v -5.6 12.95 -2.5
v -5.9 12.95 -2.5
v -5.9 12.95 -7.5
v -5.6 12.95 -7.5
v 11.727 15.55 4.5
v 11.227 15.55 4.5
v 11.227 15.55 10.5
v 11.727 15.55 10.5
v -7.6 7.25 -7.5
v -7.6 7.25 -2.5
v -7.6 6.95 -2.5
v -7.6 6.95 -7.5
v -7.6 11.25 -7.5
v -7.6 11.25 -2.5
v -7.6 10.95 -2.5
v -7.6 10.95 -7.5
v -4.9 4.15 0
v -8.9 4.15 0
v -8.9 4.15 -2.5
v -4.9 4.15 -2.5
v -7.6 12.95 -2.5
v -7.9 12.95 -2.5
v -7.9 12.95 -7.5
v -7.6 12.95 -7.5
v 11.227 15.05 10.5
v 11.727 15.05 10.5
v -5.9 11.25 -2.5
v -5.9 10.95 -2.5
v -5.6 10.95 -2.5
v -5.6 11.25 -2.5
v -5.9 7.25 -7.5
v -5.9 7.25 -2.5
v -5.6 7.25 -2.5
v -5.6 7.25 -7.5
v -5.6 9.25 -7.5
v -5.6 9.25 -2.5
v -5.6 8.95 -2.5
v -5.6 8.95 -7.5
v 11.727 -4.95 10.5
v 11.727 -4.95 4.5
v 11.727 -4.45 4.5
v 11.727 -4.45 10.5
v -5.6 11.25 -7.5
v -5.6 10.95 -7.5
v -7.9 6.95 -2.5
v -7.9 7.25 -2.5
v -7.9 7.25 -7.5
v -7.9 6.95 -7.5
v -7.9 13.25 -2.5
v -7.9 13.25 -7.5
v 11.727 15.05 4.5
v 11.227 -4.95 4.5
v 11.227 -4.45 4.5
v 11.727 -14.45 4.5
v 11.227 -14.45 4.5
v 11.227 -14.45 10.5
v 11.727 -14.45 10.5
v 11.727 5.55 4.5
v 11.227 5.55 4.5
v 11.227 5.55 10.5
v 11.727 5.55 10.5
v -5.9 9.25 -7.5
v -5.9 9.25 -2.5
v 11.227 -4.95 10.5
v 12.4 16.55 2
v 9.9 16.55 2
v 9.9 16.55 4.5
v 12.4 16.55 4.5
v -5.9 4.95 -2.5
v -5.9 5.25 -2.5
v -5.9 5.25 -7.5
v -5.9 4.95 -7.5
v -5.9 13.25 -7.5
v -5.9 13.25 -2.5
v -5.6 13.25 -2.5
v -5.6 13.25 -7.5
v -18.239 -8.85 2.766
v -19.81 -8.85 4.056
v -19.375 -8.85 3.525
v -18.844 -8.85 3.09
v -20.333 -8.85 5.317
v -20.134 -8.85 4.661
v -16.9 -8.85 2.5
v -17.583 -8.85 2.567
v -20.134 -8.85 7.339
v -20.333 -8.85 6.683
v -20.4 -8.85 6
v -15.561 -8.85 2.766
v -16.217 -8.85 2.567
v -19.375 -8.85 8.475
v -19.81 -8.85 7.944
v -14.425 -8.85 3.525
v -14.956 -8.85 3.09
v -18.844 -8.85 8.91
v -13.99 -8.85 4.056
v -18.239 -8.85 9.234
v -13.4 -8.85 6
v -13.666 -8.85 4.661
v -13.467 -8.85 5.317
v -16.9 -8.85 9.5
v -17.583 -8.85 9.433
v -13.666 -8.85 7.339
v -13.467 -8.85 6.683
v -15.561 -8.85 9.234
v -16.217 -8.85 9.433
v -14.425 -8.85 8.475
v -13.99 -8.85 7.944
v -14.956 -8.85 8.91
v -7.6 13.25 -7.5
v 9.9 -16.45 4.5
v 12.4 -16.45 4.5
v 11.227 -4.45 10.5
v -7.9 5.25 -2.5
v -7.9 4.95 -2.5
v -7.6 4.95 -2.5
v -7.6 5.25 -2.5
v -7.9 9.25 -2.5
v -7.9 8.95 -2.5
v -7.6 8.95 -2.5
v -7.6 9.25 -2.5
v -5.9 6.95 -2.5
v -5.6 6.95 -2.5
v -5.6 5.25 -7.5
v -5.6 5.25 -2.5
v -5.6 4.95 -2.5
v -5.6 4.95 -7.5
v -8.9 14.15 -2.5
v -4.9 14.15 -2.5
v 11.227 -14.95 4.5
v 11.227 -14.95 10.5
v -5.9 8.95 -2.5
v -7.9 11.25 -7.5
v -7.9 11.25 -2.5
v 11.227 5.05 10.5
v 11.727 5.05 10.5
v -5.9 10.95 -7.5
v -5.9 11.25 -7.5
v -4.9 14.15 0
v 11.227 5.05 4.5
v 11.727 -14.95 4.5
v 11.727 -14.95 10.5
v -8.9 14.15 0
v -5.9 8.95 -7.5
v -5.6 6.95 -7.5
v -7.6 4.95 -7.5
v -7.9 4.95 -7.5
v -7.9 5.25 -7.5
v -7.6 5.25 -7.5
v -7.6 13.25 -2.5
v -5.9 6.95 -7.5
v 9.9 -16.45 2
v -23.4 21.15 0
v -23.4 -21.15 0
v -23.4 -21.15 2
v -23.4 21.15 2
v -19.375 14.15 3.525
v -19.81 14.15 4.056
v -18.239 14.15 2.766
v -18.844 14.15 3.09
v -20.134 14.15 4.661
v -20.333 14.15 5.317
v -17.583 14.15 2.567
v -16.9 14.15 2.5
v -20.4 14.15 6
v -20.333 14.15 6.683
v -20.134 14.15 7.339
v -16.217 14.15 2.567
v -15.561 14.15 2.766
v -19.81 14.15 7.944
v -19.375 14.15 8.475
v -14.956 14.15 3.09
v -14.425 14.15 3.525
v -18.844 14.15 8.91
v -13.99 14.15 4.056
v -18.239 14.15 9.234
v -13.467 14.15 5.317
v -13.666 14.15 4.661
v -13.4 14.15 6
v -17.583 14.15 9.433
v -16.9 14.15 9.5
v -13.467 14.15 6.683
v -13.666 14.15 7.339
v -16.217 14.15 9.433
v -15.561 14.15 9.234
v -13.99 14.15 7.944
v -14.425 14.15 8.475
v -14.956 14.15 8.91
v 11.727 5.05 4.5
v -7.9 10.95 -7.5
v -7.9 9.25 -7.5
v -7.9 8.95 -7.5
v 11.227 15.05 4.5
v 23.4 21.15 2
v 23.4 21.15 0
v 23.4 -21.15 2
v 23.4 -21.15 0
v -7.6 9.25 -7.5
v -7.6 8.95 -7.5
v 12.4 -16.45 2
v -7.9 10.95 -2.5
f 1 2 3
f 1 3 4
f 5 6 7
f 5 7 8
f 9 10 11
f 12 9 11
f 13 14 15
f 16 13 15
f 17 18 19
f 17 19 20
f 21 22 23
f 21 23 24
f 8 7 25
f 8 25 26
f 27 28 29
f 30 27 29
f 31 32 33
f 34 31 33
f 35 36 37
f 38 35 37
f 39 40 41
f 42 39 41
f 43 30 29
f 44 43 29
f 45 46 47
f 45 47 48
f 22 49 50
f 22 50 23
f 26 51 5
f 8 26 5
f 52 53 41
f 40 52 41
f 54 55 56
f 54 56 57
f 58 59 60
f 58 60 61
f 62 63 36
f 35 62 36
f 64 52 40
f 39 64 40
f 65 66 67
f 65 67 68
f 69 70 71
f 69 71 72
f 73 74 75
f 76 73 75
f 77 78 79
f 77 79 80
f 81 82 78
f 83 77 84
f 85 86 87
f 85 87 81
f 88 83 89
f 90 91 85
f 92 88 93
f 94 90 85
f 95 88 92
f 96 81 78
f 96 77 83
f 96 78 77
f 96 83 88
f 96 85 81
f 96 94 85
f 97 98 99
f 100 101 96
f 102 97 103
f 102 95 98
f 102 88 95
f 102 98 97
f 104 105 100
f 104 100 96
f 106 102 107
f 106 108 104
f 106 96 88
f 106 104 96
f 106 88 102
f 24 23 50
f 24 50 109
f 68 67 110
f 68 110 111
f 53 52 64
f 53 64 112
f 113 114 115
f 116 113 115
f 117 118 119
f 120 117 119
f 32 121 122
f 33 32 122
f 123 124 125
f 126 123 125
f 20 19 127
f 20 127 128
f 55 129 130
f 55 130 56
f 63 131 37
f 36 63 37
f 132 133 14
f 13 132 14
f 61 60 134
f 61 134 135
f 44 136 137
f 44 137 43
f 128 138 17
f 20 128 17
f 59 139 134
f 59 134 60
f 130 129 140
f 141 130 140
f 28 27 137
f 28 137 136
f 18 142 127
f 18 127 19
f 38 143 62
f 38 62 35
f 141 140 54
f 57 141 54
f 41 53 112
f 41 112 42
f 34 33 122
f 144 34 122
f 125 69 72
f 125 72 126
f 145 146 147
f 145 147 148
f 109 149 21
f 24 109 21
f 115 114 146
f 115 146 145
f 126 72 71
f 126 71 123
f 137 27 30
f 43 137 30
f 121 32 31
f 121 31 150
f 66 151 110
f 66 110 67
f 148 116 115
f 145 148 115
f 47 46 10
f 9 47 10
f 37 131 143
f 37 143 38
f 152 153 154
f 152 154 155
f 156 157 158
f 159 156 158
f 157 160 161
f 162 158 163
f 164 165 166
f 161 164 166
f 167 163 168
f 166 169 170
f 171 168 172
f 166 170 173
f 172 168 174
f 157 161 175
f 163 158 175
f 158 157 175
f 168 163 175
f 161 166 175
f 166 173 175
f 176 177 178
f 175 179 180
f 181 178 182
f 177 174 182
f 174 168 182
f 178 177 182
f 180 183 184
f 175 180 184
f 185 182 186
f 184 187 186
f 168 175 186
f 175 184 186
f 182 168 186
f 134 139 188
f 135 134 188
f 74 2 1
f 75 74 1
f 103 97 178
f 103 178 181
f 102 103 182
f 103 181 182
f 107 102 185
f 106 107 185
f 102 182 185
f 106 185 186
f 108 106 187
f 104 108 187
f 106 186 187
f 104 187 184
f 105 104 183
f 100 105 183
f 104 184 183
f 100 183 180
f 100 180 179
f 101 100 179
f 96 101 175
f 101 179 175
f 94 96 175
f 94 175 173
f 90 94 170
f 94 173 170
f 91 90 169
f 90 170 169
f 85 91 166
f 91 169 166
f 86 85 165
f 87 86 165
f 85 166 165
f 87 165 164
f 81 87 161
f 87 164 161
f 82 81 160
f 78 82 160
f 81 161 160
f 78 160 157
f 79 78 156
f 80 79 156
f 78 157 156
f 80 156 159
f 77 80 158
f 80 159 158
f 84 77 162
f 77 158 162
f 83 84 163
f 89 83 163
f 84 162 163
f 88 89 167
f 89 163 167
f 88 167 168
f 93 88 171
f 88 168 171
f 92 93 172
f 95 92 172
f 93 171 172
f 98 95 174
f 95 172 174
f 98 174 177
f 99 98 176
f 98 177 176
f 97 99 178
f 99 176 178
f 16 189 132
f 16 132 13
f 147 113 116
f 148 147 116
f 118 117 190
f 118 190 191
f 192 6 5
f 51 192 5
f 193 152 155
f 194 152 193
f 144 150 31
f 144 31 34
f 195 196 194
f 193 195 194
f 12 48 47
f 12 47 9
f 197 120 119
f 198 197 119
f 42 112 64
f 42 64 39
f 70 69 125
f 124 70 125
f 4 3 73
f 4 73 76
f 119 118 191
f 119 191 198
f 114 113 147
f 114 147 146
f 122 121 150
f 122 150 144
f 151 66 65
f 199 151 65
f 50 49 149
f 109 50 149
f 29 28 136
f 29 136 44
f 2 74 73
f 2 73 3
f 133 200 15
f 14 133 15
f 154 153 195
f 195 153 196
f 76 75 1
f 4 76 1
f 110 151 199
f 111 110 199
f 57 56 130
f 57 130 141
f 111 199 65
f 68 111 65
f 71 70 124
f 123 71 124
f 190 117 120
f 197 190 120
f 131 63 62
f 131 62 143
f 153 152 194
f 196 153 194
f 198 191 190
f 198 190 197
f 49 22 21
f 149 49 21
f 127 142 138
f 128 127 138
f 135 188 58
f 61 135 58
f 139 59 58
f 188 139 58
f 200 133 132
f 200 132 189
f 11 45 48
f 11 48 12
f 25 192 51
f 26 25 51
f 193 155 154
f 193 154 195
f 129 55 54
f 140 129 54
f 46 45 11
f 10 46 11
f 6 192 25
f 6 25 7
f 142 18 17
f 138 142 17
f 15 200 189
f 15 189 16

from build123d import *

# Parameters (mm, degrees)
F2_W      = 46.8
F2_H      = 42.3
F3_DEPTH  = 2
F5_R      = 3.5
F6_DEPTH  = 23
F7_W      = 2.5
F7_H      = 33
F8_DEPTH  = 2.5
F9_W      = 0.5
F9_H      = 0.5
F10_DEPTH = 6
F11_W     = 4
F11_H     = 10
F12_DEPTH = 2.5
F13_W     = 0.3
F13_H     = 0.3000002508
F14_DEPTH = 5


with BuildPart() as f3:
    # F2 (on Top) → F3 (new body)
    with BuildSketch(Plane.XY):
        Rectangle(F2_W, F2_H)
    extrude(amount=F3_DEPTH)


with BuildPart() as f6:
    # F5 (on offset) → F6 (new body)
    with BuildSketch(Plane.XZ.offset(-14.15)):
        with Locations((-16.9, 6)):
            Circle(F5_R)
    extrude(amount=F6_DEPTH)


with BuildPart() as f8:
    # F7 (on face) → F8 (new body)
    with BuildSketch(Plane.XY.offset(2)):
        with Locations((11.15, 0.05)):
            Rectangle(F7_W, F7_H)
    extrude(amount=F8_DEPTH)


with BuildPart() as f10:
    # F9 (on face) → F10 (new body)
    with BuildSketch(Plane.XY.offset(4.5)):
        with Locations((11.4765835703, 15.3)):
            Rectangle(F9_W, F9_H)
    extrude(amount=F10_DEPTH)


with BuildPart() as f10b:
    # F9 (on face) → F10, piece 2 (new body)
    with BuildSketch(Plane.XY.offset(4.5)):
        with Locations((11.4765835703, 5.3)):
            Rectangle(F9_W, F9_H)
    extrude(amount=F10_DEPTH)


with BuildPart() as f10c:
    # F9 (on face) → F10, piece 3 (new body)
    with BuildSketch(Plane.XY.offset(4.5)):
        with Locations((11.4765835703, -4.7)):
            Rectangle(F9_W, F9_H)
    extrude(amount=F10_DEPTH)


with BuildPart() as f10d:
    # F9 (on face) → F10, piece 4 (new body)
    with BuildSketch(Plane.XY.offset(4.5)):
        with Locations((11.4765835703, -14.7)):
            Rectangle(F9_W, F9_H)
    extrude(amount=F10_DEPTH)


with BuildPart() as f12:
    # F11 (on face) → F12 (new body)
    with BuildSketch(Plane(origin=(0, 0, 0), x_dir=(1, 0, 0), z_dir=(0, 0, -1))):
        with Locations((-6.9, -9.15)):
            Rectangle(F11_W, F11_H)
    extrude(amount=F12_DEPTH)


with BuildPart() as f14:
    # F13 (on face) → F14 (new body)
    with BuildSketch(Plane(origin=(0, 0, -2.5), x_dir=(1, 0, 0), z_dir=(0, 0, -1))):
        with Locations((-7.75, -5.1000001254)):
            Rectangle(F13_W, F13_H)
    extrude(amount=F14_DEPTH)


with BuildPart() as f14b:
    # F13 (on face) → F14, piece 2 (new body)
    with BuildSketch(Plane(origin=(0, 0, -2.5), x_dir=(1, 0, 0), z_dir=(0, 0, -1))):
        with Locations((-7.75, -7.1000001254)):
            Rectangle(F13_W, F13_H)
    extrude(amount=F14_DEPTH)


with BuildPart() as f14c:
    # F13 (on face) → F14, piece 3 (new body)
    with BuildSketch(Plane(origin=(0, 0, -2.5), x_dir=(1, 0, 0), z_dir=(0, 0, -1))):
        with Locations((-7.75, -9.1000001254)):
            Rectangle(F13_W, F13_H)
    extrude(amount=F14_DEPTH)


with BuildPart() as f14d:
    # F13 (on face) → F14, piece 4 (new body)
    with BuildSketch(Plane(origin=(0, 0, -2.5), x_dir=(1, 0, 0), z_dir=(0, 0, -1))):
        with Locations((-7.75, -11.1000001254)):
            Rectangle(F13_W, F13_H)
    extrude(amount=F14_DEPTH)


with BuildPart() as f14e:
    # F13 (on face) → F14, piece 5 (new body)
    with BuildSketch(Plane(origin=(0, 0, -2.5), x_dir=(1, 0, 0), z_dir=(0, 0, -1))):
        with Locations((-7.75, -13.1000001254)):
            Rectangle(F13_W, F13_H)
    extrude(amount=F14_DEPTH)


with BuildPart() as f14f:
    # F13 (on face) → F14, piece 6 (new body)
    with BuildSketch(Plane(origin=(0, 0, -2.5), x_dir=(1, 0, 0), z_dir=(0, 0, -1))):
        with Locations((-5.75, -5.1000001254)):
            Rectangle(F13_W, F13_H)
    extrude(amount=F14_DEPTH)


with BuildPart() as f14g:
    # F13 (on face) → F14, piece 7 (new body)
    with BuildSketch(Plane(origin=(0, 0, -2.5), x_dir=(1, 0, 0), z_dir=(0, 0, -1))):
        with Locations((-5.75, -7.1000001254)):
            Rectangle(F13_W, F13_H)
    extrude(amount=F14_DEPTH)


with BuildPart() as f14h:
    # F13 (on face) → F14, piece 8 (new body)
    with BuildSketch(Plane(origin=(0, 0, -2.5), x_dir=(1, 0, 0), z_dir=(0, 0, -1))):
        with Locations((-5.75, -9.1000001254)):
            Rectangle(F13_W, F13_H)
    extrude(amount=F14_DEPTH)


with BuildPart() as f14i:
    # F13 (on face) → F14, piece 9 (new body)
    with BuildSketch(Plane(origin=(0, 0, -2.5), x_dir=(1, 0, 0), z_dir=(0, 0, -1))):
        with Locations((-5.75, -11.1000001254)):
            Rectangle(F13_W, F13_H)
    extrude(amount=F14_DEPTH)


with BuildPart() as f14j:
    # F13 (on face) → F14, piece 10 (new body)
    with BuildSketch(Plane(origin=(0, 0, -2.5), x_dir=(1, 0, 0), z_dir=(0, 0, -1))):
        with Locations((-5.75, -13.1000001254)):
            Rectangle(F13_W, F13_H)
    extrude(amount=F14_DEPTH)


solid = Compound([f3.part, f6.part, f8.part, f10.part, f10b.part, f10c.part, f10d.part, f12.part, f14.part, f14b.part, f14c.part, f14d.part, f14e.part, f14f.part, f14g.part, f14h.part, f14i.part, f14j.part])
